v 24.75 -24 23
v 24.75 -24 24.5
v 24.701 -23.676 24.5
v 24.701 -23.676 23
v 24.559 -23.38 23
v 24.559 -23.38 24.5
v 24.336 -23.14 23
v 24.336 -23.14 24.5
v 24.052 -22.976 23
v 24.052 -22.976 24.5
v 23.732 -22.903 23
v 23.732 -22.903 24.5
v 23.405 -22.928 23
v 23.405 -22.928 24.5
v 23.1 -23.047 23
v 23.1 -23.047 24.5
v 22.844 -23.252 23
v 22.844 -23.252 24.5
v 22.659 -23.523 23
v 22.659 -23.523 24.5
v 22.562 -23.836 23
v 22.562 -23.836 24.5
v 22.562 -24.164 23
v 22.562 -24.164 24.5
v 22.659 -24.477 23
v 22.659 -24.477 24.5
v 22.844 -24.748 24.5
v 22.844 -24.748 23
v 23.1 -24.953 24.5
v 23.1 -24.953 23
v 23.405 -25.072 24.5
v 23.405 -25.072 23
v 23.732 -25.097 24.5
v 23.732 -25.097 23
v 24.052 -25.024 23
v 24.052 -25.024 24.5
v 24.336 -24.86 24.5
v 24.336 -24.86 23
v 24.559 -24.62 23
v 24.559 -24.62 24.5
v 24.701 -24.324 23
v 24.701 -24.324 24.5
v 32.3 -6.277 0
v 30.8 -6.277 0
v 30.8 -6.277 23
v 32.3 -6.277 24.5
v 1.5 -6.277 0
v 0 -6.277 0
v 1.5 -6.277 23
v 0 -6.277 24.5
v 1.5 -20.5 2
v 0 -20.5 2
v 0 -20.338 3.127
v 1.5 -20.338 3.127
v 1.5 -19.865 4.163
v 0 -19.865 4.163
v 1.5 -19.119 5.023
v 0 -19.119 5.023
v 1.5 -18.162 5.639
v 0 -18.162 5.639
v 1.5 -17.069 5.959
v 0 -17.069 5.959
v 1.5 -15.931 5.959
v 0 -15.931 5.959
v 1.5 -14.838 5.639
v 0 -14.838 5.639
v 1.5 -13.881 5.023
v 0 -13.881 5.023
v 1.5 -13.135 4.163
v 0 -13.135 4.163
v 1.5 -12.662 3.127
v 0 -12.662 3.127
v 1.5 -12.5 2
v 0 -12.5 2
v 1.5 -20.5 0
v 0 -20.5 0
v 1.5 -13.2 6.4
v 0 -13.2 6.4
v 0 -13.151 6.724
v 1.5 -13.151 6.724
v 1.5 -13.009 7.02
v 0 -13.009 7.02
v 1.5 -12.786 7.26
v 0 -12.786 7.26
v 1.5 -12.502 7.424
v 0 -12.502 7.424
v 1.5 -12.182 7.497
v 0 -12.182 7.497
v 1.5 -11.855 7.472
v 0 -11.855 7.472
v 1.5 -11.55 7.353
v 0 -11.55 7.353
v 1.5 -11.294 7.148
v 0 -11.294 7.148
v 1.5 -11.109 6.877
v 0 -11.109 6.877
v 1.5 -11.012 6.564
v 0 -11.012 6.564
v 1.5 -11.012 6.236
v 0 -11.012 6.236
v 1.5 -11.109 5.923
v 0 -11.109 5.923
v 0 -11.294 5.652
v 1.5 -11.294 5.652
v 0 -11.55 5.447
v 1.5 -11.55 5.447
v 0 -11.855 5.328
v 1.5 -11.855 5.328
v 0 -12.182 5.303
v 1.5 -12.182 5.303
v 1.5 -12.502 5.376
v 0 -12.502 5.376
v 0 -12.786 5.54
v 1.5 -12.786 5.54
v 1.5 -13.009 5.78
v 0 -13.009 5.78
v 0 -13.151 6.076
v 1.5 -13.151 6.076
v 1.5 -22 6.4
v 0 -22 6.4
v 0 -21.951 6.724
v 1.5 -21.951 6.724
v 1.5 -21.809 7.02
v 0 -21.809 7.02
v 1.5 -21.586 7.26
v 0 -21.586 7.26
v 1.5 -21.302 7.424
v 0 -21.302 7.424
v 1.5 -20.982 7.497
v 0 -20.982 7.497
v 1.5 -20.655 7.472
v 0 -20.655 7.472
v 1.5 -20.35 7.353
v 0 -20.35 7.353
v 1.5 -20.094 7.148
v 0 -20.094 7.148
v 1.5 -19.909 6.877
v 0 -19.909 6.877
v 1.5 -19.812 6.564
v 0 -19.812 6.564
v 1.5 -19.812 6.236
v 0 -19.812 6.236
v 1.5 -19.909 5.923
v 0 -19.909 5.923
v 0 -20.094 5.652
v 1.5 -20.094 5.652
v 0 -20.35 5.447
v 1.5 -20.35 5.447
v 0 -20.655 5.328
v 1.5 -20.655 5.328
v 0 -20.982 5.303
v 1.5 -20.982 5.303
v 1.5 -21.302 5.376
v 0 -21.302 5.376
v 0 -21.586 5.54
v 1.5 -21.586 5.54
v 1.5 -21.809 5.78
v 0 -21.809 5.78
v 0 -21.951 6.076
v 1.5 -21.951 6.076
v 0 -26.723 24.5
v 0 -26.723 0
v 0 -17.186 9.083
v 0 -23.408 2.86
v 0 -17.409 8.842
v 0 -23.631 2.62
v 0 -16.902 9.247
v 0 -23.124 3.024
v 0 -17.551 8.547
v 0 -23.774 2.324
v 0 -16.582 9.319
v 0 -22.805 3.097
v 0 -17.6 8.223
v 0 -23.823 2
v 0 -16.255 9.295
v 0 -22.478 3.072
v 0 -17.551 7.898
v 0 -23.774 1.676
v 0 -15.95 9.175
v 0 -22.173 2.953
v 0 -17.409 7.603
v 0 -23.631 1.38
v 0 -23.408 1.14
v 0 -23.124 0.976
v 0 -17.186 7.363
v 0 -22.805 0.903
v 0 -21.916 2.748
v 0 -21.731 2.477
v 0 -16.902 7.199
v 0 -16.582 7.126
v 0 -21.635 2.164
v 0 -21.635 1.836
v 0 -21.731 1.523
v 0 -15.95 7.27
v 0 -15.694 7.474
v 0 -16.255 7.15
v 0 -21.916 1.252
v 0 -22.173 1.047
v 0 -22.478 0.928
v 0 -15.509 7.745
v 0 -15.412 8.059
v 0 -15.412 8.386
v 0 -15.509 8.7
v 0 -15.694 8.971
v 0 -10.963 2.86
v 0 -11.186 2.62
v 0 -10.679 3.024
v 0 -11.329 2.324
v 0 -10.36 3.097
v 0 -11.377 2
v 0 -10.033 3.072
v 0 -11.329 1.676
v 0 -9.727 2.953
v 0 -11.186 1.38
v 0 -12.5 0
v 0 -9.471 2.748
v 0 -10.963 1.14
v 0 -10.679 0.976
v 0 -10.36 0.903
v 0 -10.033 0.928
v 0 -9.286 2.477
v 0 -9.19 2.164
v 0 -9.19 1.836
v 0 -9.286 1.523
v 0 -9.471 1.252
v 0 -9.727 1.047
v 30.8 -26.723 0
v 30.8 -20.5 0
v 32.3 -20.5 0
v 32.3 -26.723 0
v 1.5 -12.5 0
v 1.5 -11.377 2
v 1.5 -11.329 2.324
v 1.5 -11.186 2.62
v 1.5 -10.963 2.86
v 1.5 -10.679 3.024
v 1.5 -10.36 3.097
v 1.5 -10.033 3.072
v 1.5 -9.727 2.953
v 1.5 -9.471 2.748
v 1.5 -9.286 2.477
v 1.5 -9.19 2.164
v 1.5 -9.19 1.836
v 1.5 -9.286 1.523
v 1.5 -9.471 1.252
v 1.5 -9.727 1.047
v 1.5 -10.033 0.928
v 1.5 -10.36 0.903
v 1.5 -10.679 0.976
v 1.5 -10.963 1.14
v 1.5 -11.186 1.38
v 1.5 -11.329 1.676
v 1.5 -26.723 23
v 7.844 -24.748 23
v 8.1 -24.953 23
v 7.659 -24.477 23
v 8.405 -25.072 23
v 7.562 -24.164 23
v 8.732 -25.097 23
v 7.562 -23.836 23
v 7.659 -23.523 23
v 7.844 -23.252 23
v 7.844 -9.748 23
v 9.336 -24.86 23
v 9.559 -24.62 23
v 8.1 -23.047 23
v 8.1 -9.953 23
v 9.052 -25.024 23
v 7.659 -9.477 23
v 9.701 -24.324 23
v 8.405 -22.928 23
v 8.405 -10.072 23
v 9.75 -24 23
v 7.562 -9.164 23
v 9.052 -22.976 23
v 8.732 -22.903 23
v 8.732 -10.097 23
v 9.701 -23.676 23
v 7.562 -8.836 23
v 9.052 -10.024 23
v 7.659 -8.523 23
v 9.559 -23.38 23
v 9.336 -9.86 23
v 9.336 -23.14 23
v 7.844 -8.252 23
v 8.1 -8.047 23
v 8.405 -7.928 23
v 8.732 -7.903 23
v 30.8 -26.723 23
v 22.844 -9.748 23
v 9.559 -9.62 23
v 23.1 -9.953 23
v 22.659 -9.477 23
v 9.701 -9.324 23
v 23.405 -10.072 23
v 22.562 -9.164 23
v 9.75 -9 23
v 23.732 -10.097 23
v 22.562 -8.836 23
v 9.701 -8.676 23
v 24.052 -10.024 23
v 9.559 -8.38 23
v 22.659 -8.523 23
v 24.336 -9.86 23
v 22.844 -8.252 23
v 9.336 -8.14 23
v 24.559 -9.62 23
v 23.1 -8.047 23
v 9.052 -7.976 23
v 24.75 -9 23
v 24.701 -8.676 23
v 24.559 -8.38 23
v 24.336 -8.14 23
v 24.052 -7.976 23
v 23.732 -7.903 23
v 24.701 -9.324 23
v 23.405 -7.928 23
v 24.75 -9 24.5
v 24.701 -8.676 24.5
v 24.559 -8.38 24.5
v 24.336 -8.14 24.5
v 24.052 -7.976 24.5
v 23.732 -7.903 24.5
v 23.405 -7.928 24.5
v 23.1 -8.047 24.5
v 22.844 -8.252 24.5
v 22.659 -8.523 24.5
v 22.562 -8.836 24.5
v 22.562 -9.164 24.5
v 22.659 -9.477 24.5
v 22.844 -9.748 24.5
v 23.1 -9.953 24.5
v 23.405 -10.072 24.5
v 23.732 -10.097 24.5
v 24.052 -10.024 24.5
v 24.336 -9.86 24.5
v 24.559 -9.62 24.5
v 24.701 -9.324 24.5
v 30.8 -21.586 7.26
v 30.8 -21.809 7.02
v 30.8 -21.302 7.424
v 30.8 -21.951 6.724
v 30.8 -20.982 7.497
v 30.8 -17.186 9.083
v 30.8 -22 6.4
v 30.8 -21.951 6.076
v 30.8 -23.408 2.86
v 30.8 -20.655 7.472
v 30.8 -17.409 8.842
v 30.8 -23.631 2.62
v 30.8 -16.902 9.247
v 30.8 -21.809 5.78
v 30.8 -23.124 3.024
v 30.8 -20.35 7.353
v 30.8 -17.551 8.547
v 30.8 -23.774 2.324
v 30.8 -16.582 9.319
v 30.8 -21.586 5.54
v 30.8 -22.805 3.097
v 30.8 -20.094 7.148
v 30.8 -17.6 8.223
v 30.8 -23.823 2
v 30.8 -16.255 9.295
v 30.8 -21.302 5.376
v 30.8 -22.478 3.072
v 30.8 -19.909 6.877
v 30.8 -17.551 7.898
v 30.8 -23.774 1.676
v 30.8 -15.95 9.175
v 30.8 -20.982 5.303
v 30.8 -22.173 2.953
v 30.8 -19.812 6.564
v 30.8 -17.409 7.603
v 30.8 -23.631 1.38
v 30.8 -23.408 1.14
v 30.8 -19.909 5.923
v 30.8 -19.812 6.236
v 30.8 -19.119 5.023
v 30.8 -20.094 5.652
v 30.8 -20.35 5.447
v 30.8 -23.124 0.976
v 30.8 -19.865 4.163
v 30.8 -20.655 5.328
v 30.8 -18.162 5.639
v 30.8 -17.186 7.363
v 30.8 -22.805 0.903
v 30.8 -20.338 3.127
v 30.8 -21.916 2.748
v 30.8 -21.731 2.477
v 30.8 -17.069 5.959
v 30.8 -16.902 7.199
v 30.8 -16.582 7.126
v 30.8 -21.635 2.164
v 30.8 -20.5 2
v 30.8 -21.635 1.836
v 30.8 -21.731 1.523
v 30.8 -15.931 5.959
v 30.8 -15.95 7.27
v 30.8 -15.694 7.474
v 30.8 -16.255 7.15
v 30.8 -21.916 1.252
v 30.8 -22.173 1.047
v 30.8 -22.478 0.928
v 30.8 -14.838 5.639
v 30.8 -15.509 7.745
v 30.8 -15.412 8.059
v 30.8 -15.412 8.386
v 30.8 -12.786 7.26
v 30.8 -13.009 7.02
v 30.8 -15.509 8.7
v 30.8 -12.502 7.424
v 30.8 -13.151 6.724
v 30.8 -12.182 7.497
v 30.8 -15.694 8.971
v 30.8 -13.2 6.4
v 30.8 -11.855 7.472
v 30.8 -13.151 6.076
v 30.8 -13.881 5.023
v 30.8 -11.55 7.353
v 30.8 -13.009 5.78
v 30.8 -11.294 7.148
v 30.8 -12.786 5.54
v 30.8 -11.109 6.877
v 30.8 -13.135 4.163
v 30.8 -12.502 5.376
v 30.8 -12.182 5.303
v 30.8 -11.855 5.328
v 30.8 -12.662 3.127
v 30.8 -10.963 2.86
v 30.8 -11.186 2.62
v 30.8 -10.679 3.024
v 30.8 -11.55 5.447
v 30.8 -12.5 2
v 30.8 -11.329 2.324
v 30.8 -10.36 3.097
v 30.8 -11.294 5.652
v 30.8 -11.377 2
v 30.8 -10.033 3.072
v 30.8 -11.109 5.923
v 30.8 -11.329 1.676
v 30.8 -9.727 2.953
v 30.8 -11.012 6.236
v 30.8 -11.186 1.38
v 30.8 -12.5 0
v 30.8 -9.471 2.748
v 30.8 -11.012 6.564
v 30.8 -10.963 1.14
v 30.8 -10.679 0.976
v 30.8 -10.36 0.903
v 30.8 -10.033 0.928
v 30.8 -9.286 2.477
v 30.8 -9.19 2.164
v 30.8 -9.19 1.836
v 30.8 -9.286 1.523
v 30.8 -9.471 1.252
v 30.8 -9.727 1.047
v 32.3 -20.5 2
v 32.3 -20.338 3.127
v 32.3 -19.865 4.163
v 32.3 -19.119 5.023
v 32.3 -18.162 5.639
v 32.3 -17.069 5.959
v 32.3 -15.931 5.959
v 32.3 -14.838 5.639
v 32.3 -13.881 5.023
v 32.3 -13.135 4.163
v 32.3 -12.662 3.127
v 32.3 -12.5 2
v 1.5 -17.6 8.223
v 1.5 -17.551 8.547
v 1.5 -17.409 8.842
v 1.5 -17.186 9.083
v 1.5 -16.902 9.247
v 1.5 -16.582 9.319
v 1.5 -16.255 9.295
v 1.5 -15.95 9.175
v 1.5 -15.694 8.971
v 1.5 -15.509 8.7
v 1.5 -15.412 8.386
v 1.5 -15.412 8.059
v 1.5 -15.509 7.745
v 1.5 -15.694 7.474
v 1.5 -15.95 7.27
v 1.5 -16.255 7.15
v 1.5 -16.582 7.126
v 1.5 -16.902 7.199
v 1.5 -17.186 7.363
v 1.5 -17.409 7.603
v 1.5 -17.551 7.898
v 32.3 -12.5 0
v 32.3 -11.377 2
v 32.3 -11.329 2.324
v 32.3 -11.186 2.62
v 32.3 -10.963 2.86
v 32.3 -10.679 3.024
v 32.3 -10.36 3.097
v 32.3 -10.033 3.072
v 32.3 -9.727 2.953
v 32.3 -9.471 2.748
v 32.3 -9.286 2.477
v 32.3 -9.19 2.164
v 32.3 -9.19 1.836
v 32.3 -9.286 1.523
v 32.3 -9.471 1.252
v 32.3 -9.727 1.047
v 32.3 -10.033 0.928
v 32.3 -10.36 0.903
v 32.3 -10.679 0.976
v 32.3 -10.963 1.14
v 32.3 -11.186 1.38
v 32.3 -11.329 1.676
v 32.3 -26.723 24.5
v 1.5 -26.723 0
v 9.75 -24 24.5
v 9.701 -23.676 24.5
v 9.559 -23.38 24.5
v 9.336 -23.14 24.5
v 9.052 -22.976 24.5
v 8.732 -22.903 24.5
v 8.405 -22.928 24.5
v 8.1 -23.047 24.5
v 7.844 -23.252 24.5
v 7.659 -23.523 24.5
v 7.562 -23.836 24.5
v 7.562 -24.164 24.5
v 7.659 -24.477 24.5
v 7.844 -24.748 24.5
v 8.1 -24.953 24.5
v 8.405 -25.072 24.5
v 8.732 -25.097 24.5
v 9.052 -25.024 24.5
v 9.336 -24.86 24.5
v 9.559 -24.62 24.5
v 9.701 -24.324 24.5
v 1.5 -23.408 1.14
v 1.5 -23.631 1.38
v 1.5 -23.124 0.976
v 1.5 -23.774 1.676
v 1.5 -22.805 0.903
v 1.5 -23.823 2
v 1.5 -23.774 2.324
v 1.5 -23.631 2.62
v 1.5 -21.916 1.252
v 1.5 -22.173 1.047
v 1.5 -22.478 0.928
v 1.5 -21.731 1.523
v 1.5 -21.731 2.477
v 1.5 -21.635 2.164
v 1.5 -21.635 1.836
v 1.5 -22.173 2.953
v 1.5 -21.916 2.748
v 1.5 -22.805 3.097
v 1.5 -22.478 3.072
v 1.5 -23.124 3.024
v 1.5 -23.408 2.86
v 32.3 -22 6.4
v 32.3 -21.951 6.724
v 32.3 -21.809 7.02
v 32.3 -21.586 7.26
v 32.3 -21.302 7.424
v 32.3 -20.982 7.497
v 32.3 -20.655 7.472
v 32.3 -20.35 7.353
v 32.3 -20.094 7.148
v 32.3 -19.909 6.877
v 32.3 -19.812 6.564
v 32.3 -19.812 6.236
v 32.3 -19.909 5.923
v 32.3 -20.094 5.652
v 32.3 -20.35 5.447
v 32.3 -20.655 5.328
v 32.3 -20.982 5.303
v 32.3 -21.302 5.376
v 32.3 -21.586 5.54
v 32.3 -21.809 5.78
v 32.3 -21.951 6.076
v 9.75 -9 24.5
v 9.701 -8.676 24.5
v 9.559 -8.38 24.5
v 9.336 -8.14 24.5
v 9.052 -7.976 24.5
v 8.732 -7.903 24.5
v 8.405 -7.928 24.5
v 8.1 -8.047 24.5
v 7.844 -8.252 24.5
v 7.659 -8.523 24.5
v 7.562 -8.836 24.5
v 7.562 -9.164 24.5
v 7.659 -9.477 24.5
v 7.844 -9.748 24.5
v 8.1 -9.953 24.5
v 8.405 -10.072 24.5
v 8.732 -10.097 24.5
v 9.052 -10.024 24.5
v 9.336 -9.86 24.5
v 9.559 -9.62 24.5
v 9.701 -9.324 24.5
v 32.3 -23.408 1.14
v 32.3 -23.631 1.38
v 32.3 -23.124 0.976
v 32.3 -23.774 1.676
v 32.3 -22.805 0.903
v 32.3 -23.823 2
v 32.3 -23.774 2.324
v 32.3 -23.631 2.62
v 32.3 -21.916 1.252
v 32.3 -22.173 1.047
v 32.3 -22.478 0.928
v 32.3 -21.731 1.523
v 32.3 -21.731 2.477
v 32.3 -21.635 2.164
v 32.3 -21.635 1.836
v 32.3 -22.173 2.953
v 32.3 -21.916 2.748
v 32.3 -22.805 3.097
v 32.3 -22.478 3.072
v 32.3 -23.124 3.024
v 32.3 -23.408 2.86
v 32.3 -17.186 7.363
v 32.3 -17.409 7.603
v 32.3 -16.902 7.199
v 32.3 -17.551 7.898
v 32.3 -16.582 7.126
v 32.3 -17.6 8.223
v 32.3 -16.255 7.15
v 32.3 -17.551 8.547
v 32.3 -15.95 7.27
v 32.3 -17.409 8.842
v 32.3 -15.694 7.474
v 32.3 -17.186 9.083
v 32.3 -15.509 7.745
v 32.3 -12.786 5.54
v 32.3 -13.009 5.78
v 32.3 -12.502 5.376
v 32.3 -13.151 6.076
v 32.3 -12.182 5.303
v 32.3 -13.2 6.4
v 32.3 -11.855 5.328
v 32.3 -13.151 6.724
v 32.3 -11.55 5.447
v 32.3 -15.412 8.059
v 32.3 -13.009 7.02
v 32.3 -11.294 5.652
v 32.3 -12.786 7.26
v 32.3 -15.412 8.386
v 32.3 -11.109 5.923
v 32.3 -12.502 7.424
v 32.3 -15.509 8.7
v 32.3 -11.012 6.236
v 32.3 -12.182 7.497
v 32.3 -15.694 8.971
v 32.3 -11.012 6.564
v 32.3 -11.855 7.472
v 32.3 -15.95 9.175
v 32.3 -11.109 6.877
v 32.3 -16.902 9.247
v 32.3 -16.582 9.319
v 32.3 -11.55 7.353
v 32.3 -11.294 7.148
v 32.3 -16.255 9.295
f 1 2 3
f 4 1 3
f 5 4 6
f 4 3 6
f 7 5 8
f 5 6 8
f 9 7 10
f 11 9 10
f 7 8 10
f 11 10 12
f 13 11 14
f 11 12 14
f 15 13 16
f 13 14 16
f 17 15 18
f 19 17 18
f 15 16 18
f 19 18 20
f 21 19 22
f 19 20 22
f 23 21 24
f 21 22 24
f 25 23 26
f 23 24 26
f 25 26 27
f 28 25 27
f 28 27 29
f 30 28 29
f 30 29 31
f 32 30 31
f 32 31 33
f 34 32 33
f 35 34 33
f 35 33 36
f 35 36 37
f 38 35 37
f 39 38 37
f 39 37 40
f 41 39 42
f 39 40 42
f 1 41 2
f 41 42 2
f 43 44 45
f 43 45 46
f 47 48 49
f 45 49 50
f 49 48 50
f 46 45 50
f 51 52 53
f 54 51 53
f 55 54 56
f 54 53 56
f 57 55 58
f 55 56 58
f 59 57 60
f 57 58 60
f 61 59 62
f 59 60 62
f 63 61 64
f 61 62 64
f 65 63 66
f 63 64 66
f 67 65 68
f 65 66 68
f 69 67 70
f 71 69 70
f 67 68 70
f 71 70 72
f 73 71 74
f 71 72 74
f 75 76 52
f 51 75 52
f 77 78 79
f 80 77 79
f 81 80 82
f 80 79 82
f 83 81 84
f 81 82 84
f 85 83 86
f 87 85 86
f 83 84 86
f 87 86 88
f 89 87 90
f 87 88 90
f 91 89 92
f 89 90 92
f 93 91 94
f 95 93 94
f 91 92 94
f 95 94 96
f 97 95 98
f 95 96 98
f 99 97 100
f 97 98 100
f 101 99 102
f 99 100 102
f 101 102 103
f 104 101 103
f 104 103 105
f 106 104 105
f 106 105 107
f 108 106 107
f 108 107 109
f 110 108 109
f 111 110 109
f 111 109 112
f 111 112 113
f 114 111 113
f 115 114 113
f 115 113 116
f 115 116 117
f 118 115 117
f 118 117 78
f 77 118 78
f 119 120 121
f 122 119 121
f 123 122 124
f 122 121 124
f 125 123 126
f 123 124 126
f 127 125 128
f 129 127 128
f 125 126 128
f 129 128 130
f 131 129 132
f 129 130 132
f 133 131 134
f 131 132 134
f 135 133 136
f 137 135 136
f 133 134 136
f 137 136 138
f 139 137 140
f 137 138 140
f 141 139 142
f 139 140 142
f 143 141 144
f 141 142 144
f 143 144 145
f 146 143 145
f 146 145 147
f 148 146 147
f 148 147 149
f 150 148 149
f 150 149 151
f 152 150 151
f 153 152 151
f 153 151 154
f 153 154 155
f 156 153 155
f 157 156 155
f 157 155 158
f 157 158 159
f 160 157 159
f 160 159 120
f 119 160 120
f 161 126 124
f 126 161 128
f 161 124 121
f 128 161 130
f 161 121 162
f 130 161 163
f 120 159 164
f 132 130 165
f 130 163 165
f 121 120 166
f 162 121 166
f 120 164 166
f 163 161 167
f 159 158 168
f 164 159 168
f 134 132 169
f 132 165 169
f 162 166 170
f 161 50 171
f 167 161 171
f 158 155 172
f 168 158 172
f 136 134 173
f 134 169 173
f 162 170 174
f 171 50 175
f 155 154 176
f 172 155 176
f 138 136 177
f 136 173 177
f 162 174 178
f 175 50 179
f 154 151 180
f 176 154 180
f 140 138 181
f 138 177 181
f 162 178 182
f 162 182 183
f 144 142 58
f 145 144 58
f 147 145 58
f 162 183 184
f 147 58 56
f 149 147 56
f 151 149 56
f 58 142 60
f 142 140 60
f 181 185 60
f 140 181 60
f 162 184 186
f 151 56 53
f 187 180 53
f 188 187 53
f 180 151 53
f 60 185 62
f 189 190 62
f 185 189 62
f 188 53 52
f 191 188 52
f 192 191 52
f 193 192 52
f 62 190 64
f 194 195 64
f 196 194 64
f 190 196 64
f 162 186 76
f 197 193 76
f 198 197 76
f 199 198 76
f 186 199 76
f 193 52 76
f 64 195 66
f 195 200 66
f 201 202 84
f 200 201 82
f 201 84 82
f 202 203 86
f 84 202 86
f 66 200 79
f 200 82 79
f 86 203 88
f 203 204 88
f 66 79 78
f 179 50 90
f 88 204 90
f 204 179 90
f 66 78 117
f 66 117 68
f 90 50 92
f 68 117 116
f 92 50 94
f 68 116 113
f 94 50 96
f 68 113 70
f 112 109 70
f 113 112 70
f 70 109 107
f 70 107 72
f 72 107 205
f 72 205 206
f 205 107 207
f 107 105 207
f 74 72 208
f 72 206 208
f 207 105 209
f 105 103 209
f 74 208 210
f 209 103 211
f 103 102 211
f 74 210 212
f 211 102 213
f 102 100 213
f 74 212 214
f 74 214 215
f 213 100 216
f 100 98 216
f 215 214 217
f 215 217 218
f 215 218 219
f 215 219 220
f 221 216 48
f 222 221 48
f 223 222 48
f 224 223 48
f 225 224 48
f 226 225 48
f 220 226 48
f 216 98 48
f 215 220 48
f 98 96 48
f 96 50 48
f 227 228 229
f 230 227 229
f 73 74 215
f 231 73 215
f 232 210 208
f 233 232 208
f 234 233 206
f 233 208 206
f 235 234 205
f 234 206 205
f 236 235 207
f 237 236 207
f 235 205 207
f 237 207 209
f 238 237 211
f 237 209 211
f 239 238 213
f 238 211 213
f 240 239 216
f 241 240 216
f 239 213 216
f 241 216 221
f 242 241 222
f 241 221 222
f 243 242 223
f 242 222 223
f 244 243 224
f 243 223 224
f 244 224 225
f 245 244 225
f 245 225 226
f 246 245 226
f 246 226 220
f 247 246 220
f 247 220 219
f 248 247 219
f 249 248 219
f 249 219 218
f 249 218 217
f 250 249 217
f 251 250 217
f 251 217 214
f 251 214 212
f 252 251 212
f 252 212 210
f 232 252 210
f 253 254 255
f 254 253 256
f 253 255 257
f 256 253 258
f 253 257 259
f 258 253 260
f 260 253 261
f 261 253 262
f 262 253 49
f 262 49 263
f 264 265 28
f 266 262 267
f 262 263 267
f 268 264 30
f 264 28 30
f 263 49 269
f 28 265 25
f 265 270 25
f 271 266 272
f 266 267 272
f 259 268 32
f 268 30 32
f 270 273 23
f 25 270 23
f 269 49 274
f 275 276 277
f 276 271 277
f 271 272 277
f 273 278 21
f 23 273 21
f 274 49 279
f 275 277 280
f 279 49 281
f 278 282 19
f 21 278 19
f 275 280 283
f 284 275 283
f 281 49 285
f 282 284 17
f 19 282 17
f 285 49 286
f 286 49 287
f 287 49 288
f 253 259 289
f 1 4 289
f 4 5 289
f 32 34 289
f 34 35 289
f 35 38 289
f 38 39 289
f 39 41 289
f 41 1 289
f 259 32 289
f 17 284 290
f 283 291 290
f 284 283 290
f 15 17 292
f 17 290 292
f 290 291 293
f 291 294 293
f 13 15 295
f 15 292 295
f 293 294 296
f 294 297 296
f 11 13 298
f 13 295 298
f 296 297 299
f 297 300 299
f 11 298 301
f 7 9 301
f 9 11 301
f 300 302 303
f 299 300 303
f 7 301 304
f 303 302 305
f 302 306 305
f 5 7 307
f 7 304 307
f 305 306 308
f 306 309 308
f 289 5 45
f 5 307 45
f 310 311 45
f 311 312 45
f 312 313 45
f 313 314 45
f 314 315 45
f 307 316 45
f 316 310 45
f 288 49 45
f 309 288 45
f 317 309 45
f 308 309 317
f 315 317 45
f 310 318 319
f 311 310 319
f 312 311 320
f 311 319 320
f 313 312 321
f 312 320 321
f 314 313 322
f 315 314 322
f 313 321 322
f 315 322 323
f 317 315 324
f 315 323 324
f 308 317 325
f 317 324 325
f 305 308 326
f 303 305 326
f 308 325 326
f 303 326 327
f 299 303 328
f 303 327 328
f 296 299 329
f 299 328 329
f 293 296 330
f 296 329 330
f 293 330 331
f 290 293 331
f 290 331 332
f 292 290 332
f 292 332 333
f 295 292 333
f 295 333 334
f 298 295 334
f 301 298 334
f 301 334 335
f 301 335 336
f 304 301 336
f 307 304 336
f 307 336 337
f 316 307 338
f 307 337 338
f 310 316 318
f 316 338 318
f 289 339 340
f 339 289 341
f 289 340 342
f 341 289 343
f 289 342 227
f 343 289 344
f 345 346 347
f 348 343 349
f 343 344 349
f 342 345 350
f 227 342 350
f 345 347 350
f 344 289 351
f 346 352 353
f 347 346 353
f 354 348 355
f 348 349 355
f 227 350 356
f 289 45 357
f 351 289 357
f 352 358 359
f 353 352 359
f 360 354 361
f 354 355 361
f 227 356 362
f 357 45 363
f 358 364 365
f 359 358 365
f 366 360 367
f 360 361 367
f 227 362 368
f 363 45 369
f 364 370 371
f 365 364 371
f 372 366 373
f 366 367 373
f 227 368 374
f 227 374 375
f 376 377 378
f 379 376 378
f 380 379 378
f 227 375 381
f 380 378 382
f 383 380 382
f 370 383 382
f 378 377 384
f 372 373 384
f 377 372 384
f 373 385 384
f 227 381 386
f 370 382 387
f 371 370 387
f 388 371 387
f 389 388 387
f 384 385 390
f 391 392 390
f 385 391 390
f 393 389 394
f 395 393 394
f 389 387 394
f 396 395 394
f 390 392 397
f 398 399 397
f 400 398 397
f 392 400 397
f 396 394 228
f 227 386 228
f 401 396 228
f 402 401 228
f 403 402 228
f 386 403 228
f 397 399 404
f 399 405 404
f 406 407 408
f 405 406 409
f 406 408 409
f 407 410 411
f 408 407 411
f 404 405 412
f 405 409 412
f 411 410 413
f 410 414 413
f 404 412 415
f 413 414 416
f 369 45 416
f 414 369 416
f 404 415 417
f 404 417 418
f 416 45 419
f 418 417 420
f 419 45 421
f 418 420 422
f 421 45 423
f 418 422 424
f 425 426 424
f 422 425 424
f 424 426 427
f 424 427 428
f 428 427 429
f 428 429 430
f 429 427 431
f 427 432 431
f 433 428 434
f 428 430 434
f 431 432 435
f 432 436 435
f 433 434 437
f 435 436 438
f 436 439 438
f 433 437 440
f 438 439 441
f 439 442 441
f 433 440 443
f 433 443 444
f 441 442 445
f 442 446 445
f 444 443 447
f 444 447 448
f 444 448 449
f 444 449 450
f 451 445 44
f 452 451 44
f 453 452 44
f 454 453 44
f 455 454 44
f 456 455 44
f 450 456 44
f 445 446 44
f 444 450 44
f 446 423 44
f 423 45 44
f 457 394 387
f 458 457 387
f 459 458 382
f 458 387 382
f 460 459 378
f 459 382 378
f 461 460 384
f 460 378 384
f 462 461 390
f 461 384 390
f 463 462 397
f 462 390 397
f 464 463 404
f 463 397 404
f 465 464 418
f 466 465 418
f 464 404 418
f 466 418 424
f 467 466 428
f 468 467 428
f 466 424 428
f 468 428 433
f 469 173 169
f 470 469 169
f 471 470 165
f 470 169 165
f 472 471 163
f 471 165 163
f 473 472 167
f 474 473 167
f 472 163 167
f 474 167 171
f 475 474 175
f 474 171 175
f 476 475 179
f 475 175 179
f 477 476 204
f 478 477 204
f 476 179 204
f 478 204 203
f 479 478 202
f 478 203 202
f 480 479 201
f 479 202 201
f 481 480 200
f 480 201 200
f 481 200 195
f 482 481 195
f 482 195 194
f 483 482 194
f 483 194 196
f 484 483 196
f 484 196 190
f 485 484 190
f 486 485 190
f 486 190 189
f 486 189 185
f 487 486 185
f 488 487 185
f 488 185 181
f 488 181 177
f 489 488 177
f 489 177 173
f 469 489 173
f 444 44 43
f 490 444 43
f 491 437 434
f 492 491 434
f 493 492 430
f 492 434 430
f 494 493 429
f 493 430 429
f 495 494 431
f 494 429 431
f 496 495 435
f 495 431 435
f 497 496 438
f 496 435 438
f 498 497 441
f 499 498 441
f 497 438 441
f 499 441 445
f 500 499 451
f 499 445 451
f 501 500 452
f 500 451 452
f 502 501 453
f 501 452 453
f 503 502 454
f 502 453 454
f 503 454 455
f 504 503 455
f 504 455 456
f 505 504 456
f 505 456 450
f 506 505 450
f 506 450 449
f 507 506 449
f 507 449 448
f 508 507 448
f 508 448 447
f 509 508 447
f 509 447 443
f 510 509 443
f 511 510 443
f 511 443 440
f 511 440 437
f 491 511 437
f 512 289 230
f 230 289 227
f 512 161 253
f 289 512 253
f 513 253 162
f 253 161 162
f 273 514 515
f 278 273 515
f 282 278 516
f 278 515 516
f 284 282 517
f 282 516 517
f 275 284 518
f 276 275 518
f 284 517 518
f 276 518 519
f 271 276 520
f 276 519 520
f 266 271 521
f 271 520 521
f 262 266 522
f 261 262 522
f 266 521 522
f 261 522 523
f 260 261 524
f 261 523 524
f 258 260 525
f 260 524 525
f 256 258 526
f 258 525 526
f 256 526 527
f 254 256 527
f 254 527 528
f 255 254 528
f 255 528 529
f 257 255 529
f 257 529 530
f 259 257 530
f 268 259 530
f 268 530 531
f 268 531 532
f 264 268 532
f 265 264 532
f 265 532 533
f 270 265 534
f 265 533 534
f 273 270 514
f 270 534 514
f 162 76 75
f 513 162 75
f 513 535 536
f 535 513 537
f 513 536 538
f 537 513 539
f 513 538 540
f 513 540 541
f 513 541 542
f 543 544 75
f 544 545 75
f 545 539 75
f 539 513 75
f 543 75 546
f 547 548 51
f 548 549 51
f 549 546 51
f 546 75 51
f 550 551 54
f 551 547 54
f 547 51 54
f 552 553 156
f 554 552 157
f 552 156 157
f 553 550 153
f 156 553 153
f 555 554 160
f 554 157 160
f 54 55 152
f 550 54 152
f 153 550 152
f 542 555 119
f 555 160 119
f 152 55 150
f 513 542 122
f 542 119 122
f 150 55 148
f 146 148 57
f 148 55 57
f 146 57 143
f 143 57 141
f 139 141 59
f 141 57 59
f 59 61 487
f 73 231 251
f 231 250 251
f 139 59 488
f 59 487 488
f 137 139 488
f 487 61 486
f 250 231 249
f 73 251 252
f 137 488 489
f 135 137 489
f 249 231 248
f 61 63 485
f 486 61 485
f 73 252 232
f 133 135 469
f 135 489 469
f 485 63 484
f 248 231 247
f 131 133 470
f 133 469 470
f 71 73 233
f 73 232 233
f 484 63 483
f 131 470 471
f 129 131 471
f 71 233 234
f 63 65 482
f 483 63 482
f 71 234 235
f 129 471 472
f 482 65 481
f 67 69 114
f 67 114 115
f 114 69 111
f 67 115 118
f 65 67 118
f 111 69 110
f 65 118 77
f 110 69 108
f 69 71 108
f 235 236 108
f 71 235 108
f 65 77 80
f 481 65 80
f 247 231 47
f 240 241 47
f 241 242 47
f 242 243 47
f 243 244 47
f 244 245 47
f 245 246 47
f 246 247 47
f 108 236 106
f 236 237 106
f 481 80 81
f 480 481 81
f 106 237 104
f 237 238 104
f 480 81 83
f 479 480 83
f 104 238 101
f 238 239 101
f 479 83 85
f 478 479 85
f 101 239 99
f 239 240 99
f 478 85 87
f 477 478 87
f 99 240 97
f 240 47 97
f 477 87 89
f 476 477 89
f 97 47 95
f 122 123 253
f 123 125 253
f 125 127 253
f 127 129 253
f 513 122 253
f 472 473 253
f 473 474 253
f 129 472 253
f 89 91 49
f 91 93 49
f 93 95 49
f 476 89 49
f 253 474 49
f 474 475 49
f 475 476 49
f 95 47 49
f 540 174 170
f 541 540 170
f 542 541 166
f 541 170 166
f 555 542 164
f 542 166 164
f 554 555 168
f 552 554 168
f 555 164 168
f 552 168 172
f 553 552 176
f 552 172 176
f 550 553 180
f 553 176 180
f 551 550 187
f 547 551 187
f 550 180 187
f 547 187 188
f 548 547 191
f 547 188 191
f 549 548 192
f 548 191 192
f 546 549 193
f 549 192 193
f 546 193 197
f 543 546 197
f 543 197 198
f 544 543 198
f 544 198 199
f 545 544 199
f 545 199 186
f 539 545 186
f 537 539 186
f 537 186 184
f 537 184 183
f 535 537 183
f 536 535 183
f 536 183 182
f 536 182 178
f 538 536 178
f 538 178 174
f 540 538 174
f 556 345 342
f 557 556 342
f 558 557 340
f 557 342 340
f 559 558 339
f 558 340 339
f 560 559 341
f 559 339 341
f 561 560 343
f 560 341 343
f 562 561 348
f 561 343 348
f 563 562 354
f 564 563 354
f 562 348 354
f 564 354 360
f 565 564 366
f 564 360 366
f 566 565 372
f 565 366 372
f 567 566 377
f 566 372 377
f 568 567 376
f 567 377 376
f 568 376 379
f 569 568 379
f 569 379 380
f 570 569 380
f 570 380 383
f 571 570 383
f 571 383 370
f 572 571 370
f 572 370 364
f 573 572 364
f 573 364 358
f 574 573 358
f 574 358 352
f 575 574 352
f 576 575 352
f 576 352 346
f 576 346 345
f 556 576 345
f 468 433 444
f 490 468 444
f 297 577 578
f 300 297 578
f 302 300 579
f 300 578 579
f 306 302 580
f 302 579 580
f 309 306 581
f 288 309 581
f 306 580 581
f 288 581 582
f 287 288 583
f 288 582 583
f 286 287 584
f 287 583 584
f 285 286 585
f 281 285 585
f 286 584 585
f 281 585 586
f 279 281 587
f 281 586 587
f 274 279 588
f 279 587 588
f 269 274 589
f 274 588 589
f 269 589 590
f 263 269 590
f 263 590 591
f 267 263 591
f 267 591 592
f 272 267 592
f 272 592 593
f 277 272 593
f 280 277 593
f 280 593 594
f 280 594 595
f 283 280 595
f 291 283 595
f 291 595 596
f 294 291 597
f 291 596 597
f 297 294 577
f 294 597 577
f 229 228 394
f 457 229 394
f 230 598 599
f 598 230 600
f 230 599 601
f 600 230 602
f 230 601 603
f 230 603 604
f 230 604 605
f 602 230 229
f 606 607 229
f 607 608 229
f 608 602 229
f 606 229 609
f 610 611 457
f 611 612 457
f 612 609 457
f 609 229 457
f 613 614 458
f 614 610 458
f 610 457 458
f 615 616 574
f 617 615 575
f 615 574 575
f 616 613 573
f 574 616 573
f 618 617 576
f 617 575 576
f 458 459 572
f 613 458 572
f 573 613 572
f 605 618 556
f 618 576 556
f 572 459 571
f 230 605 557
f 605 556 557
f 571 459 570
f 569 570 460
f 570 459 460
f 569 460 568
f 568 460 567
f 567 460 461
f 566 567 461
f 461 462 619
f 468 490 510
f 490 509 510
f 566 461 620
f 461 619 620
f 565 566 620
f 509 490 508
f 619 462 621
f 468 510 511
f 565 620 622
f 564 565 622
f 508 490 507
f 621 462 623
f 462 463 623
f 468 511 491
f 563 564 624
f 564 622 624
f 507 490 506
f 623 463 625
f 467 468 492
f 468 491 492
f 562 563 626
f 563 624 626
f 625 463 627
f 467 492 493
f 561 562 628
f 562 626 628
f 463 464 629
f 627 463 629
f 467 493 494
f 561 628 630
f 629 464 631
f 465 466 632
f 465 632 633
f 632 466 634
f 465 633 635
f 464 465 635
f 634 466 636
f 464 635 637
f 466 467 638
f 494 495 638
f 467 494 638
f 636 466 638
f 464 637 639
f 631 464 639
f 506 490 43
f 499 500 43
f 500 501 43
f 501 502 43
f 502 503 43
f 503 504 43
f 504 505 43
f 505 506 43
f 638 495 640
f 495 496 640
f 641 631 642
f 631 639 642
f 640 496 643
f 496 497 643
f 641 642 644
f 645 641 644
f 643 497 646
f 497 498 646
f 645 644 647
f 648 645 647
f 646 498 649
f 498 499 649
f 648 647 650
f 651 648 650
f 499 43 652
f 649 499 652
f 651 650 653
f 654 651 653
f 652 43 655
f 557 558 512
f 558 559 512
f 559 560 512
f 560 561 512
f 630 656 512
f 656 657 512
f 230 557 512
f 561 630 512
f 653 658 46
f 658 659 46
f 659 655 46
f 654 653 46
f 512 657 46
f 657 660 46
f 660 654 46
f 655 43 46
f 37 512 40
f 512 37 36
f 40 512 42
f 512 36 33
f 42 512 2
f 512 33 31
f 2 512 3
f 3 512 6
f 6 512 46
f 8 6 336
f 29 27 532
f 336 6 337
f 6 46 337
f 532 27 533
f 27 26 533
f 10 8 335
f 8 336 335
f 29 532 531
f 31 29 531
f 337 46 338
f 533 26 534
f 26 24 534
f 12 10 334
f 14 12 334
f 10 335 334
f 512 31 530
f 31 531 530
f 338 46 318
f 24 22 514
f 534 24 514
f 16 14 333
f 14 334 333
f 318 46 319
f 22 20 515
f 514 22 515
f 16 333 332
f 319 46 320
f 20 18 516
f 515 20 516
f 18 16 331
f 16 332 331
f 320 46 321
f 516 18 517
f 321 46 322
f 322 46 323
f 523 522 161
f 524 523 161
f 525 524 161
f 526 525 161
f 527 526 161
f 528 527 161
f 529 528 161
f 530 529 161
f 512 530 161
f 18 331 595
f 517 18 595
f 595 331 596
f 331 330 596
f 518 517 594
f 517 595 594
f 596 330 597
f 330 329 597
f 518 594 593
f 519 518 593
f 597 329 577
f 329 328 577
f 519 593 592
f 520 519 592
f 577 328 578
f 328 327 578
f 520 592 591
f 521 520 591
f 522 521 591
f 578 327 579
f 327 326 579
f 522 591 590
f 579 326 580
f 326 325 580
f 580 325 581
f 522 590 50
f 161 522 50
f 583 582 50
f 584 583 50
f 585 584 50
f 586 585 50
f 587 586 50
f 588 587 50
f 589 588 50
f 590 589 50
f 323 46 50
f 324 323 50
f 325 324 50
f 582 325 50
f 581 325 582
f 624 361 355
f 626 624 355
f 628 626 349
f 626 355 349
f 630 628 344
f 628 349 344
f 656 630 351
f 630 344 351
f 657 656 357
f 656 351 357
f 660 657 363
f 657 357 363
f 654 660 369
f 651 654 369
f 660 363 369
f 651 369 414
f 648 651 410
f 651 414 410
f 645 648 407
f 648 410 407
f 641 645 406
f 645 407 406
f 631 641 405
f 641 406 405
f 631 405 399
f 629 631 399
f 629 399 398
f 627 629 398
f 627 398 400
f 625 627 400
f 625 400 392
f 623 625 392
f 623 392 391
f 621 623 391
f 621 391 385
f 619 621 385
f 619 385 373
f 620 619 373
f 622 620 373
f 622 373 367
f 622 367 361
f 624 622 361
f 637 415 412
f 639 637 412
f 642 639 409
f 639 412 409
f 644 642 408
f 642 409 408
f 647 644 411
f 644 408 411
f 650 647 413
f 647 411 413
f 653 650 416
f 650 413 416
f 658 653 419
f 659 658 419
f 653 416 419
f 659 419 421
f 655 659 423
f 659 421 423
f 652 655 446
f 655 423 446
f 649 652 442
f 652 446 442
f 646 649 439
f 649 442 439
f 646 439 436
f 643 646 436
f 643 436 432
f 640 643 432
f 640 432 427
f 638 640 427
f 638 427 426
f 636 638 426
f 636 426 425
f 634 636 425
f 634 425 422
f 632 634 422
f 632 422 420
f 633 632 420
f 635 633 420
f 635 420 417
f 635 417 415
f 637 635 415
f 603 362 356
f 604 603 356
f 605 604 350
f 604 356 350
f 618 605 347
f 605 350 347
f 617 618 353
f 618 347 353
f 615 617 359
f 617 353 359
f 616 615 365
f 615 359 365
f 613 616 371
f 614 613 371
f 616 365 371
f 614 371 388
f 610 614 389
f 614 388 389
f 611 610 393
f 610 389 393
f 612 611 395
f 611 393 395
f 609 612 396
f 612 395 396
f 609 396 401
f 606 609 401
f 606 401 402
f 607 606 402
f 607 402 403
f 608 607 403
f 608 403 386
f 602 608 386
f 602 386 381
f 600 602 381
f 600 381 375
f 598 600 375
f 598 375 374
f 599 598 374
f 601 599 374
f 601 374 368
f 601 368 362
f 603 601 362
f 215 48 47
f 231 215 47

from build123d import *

# Parameters (mm, degrees)
F1_DEPTH = 33
F2_R     = 1.1
F2_W     = 6.27746
F2_H     = 1.5
F3_DEPTH = 32.301
F4_R     = 1.1
F5_DEPTH = 1.5


with BuildPart() as f1:
    # F0 (on Front) → F1 (new body)
    with BuildSketch(Plane.XZ):
        Polygon((0, 24.5), (0, 0), (1.5, 0), (1.5, 23), (30.8, 23), (30.8, 0), (32.3, 0), (32.3, 24.5), align=None)
    extrude(amount=F1_DEPTH)

    # F2 (on face) → F3 (cut, through all)
    with BuildSketch(Plane(origin=(0, 0, 0), x_dir=(0, -1, 0), z_dir=(-1, 0, 0))):
        with BuildLine():
            Line((20.5, 0), (20.5, 2))
            ThreePointArc((20.5, 2), (16.5, 6), (12.5, 2))
            Line((12.5, 2), (12.5, 0))
            Line((12.5, 0), (20.5, 0))
        make_face()
        with Locations((22.72254, 2)):
            Circle(F2_R)
        with Locations((20.9, 6.4)):
            Circle(F2_R)
        with Locations((16.5, 8.22254)):
            Circle(F2_R)
        with Locations((12.1, 6.4)):
            Circle(F2_R)
        with Locations((10.27746, 2)):
            Circle(F2_R)
        Polygon((0, 0), (6.27746, 0), (0, 23), align=None)
        Polygon((0, 23), (6.27746, 0), (6.27746, 23), align=None)
        with Locations((3.13873, 23.75)):
            Rectangle(F2_W, F2_H)
        Polygon((26.72254, 0), (33, 0), (33, 23), align=None)
        Polygon((26.72254, 0), (33, 23), (26.72254, 23), align=None)
        with Locations((29.86127, 23.75)):
            Rectangle(F2_W, F2_H)
    extrude(amount=-F3_DEPTH, mode=Mode.SUBTRACT)

    # F4 (on face) → F5 (cut, through all)
    with BuildSketch(Plane.XY.offset(24.5)):
        with Locations((8.65, -9)):
            Circle(F4_R)
        with Locations((23.65, -9)):
            Circle(F4_R)
        with Locations((8.65, -24)):
            Circle(F4_R)
        with Locations((23.65, -24)):
            Circle(F4_R)
    extrude(amount=-F5_DEPTH, mode=Mode.SUBTRACT)


solid = f1.part
